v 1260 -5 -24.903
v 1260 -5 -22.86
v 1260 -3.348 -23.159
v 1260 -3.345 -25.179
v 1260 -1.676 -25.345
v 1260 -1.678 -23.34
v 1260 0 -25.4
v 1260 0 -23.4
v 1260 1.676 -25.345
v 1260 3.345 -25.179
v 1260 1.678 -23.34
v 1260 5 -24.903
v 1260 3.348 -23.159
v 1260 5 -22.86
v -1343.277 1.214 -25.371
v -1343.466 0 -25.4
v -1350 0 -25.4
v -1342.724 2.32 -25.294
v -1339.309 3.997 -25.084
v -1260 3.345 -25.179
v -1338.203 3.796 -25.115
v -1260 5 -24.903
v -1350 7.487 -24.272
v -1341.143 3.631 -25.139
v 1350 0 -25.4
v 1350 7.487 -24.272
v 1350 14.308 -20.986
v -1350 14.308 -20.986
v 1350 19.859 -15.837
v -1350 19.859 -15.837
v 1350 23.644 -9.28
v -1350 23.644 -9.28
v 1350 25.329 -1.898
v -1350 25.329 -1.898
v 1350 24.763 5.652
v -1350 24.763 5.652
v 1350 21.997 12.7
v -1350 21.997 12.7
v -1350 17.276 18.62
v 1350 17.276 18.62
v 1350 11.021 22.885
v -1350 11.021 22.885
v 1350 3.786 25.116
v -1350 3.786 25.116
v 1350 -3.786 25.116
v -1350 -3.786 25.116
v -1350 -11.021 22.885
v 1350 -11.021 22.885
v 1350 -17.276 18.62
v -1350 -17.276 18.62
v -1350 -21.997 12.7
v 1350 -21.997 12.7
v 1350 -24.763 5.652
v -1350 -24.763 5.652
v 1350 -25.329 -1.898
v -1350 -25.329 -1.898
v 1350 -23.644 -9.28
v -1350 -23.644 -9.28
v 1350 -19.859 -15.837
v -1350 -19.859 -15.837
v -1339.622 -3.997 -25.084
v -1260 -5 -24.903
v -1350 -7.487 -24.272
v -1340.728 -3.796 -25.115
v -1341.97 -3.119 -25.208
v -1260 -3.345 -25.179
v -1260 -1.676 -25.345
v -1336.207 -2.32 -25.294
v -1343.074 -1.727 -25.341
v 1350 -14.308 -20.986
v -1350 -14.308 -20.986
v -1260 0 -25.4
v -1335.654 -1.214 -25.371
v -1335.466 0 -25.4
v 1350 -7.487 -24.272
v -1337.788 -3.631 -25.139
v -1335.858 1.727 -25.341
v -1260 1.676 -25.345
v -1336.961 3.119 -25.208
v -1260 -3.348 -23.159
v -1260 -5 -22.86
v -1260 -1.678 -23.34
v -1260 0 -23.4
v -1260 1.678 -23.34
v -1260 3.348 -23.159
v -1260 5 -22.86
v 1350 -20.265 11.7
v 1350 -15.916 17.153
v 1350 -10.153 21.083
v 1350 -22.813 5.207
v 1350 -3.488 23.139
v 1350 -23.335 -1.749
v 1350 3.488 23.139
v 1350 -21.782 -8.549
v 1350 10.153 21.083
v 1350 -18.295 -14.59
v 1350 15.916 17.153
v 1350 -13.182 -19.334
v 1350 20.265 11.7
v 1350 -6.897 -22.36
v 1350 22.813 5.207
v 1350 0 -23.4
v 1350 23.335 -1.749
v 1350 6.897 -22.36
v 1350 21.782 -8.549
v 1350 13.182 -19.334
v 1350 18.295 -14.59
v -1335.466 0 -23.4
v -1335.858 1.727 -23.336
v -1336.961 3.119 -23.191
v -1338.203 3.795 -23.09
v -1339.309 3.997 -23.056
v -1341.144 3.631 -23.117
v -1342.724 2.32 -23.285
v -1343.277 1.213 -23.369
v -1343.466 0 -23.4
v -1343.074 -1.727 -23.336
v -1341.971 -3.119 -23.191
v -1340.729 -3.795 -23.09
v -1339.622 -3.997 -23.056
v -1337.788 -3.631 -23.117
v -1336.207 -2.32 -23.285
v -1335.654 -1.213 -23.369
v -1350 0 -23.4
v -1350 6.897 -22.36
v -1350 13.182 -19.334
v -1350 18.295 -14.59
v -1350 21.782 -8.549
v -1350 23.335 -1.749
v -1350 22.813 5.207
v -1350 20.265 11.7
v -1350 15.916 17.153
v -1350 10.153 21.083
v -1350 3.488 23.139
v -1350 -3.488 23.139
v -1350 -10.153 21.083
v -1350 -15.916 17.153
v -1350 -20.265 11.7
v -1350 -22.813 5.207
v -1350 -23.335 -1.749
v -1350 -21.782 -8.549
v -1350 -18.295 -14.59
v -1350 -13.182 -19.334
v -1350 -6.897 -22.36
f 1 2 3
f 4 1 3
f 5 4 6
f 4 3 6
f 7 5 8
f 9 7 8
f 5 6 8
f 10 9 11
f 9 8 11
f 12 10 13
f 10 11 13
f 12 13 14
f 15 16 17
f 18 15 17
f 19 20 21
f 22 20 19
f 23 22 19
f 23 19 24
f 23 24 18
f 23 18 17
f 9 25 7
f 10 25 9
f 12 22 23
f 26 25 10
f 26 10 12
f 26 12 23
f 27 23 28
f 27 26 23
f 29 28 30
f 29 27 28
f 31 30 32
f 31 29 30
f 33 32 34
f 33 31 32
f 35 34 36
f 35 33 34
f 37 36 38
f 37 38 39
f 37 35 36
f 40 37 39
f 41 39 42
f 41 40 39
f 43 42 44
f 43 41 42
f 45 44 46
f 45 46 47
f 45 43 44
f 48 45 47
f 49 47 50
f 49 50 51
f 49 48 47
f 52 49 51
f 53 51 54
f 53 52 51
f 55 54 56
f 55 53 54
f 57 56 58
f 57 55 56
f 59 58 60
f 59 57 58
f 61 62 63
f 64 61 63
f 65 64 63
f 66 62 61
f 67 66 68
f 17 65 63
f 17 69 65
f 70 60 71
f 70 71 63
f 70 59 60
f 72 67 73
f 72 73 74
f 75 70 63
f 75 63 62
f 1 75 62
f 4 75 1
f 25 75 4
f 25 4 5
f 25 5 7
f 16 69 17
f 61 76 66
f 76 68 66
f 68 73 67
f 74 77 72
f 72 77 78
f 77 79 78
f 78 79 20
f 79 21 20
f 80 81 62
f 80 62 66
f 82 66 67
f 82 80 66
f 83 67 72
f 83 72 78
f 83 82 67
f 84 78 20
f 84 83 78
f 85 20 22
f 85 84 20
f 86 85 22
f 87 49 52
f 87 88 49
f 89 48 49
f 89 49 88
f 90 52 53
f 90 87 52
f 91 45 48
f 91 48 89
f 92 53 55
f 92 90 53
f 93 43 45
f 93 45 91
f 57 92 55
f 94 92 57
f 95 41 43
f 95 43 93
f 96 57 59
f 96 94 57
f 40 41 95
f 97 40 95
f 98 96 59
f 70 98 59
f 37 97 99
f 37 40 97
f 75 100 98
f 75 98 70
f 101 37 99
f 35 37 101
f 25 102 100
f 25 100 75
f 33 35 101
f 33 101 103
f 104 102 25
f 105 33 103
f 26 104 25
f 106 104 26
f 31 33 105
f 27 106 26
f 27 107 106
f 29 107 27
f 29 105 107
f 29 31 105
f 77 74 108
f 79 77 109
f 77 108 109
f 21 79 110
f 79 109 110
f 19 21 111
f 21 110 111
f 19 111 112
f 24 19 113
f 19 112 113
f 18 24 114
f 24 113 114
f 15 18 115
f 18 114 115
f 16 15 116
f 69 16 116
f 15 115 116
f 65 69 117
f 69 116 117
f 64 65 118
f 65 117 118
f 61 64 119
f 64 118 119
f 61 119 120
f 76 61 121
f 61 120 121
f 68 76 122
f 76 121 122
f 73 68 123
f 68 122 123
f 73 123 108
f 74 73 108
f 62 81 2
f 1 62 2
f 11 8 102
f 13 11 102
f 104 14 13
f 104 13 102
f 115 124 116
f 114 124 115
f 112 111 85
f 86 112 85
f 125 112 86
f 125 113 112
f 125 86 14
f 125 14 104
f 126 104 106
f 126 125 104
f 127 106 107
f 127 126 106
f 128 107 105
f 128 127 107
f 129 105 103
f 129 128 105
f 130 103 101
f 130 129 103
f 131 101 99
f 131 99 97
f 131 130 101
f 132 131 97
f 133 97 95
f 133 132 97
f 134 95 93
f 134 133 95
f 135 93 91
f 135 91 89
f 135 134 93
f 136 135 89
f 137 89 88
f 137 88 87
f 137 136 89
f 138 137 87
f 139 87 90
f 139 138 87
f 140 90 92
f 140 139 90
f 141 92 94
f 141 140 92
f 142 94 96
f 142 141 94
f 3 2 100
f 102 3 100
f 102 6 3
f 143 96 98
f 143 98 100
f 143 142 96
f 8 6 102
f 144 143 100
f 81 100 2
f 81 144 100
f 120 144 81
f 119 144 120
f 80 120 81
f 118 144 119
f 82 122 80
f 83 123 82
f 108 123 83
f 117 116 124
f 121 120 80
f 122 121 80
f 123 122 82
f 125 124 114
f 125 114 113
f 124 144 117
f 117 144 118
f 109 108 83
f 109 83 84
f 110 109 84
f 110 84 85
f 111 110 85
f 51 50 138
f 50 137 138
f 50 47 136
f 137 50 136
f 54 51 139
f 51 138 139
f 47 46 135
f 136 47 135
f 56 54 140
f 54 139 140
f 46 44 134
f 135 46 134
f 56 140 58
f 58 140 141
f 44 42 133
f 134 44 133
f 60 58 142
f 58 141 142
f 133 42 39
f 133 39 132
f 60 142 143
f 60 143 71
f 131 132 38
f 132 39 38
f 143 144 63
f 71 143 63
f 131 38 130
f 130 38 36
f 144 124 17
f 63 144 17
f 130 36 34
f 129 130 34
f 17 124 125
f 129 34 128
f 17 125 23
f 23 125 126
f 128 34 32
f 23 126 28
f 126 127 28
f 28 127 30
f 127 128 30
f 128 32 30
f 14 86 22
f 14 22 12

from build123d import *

# Parameters (mm, degrees)
CROQUIS1_R              = 25.4
CROQUIS1_R_2            = 23.4
SALIENTE_EXTRUIR1_DEPTH = 1350
CROQUIS2_R              = 4
CROQUIS2_W              = 2520
CROQUIS2_H              = 10
CORTAR_EXTRUIR1_DEPTH   = 1351.477811739


with BuildPart() as part:
    # Croquis1 → Saliente-Extruir1 (new, symmetric)
    with BuildSketch(Plane(origin=(0, 0, 0), x_dir=(0, 0, -1), z_dir=(1, 0, 0))):
        Circle(CROQUIS1_R)
        Circle(CROQUIS1_R_2, mode=Mode.SUBTRACT)
    extrude(amount=SALIENTE_EXTRUIR1_DEPTH, both=True)

    # Croquis2 → Cortar-Extruir1 (cut, through all)
    with BuildSketch(Plane.XY):
        with Locations((-1339.465777124, 0)):
            Circle(CROQUIS2_R)
        Rectangle(CROQUIS2_W, CROQUIS2_H)
    extrude(amount=-CORTAR_EXTRUIR1_DEPTH, mode=Mode.SUBTRACT)


solid = part.part
